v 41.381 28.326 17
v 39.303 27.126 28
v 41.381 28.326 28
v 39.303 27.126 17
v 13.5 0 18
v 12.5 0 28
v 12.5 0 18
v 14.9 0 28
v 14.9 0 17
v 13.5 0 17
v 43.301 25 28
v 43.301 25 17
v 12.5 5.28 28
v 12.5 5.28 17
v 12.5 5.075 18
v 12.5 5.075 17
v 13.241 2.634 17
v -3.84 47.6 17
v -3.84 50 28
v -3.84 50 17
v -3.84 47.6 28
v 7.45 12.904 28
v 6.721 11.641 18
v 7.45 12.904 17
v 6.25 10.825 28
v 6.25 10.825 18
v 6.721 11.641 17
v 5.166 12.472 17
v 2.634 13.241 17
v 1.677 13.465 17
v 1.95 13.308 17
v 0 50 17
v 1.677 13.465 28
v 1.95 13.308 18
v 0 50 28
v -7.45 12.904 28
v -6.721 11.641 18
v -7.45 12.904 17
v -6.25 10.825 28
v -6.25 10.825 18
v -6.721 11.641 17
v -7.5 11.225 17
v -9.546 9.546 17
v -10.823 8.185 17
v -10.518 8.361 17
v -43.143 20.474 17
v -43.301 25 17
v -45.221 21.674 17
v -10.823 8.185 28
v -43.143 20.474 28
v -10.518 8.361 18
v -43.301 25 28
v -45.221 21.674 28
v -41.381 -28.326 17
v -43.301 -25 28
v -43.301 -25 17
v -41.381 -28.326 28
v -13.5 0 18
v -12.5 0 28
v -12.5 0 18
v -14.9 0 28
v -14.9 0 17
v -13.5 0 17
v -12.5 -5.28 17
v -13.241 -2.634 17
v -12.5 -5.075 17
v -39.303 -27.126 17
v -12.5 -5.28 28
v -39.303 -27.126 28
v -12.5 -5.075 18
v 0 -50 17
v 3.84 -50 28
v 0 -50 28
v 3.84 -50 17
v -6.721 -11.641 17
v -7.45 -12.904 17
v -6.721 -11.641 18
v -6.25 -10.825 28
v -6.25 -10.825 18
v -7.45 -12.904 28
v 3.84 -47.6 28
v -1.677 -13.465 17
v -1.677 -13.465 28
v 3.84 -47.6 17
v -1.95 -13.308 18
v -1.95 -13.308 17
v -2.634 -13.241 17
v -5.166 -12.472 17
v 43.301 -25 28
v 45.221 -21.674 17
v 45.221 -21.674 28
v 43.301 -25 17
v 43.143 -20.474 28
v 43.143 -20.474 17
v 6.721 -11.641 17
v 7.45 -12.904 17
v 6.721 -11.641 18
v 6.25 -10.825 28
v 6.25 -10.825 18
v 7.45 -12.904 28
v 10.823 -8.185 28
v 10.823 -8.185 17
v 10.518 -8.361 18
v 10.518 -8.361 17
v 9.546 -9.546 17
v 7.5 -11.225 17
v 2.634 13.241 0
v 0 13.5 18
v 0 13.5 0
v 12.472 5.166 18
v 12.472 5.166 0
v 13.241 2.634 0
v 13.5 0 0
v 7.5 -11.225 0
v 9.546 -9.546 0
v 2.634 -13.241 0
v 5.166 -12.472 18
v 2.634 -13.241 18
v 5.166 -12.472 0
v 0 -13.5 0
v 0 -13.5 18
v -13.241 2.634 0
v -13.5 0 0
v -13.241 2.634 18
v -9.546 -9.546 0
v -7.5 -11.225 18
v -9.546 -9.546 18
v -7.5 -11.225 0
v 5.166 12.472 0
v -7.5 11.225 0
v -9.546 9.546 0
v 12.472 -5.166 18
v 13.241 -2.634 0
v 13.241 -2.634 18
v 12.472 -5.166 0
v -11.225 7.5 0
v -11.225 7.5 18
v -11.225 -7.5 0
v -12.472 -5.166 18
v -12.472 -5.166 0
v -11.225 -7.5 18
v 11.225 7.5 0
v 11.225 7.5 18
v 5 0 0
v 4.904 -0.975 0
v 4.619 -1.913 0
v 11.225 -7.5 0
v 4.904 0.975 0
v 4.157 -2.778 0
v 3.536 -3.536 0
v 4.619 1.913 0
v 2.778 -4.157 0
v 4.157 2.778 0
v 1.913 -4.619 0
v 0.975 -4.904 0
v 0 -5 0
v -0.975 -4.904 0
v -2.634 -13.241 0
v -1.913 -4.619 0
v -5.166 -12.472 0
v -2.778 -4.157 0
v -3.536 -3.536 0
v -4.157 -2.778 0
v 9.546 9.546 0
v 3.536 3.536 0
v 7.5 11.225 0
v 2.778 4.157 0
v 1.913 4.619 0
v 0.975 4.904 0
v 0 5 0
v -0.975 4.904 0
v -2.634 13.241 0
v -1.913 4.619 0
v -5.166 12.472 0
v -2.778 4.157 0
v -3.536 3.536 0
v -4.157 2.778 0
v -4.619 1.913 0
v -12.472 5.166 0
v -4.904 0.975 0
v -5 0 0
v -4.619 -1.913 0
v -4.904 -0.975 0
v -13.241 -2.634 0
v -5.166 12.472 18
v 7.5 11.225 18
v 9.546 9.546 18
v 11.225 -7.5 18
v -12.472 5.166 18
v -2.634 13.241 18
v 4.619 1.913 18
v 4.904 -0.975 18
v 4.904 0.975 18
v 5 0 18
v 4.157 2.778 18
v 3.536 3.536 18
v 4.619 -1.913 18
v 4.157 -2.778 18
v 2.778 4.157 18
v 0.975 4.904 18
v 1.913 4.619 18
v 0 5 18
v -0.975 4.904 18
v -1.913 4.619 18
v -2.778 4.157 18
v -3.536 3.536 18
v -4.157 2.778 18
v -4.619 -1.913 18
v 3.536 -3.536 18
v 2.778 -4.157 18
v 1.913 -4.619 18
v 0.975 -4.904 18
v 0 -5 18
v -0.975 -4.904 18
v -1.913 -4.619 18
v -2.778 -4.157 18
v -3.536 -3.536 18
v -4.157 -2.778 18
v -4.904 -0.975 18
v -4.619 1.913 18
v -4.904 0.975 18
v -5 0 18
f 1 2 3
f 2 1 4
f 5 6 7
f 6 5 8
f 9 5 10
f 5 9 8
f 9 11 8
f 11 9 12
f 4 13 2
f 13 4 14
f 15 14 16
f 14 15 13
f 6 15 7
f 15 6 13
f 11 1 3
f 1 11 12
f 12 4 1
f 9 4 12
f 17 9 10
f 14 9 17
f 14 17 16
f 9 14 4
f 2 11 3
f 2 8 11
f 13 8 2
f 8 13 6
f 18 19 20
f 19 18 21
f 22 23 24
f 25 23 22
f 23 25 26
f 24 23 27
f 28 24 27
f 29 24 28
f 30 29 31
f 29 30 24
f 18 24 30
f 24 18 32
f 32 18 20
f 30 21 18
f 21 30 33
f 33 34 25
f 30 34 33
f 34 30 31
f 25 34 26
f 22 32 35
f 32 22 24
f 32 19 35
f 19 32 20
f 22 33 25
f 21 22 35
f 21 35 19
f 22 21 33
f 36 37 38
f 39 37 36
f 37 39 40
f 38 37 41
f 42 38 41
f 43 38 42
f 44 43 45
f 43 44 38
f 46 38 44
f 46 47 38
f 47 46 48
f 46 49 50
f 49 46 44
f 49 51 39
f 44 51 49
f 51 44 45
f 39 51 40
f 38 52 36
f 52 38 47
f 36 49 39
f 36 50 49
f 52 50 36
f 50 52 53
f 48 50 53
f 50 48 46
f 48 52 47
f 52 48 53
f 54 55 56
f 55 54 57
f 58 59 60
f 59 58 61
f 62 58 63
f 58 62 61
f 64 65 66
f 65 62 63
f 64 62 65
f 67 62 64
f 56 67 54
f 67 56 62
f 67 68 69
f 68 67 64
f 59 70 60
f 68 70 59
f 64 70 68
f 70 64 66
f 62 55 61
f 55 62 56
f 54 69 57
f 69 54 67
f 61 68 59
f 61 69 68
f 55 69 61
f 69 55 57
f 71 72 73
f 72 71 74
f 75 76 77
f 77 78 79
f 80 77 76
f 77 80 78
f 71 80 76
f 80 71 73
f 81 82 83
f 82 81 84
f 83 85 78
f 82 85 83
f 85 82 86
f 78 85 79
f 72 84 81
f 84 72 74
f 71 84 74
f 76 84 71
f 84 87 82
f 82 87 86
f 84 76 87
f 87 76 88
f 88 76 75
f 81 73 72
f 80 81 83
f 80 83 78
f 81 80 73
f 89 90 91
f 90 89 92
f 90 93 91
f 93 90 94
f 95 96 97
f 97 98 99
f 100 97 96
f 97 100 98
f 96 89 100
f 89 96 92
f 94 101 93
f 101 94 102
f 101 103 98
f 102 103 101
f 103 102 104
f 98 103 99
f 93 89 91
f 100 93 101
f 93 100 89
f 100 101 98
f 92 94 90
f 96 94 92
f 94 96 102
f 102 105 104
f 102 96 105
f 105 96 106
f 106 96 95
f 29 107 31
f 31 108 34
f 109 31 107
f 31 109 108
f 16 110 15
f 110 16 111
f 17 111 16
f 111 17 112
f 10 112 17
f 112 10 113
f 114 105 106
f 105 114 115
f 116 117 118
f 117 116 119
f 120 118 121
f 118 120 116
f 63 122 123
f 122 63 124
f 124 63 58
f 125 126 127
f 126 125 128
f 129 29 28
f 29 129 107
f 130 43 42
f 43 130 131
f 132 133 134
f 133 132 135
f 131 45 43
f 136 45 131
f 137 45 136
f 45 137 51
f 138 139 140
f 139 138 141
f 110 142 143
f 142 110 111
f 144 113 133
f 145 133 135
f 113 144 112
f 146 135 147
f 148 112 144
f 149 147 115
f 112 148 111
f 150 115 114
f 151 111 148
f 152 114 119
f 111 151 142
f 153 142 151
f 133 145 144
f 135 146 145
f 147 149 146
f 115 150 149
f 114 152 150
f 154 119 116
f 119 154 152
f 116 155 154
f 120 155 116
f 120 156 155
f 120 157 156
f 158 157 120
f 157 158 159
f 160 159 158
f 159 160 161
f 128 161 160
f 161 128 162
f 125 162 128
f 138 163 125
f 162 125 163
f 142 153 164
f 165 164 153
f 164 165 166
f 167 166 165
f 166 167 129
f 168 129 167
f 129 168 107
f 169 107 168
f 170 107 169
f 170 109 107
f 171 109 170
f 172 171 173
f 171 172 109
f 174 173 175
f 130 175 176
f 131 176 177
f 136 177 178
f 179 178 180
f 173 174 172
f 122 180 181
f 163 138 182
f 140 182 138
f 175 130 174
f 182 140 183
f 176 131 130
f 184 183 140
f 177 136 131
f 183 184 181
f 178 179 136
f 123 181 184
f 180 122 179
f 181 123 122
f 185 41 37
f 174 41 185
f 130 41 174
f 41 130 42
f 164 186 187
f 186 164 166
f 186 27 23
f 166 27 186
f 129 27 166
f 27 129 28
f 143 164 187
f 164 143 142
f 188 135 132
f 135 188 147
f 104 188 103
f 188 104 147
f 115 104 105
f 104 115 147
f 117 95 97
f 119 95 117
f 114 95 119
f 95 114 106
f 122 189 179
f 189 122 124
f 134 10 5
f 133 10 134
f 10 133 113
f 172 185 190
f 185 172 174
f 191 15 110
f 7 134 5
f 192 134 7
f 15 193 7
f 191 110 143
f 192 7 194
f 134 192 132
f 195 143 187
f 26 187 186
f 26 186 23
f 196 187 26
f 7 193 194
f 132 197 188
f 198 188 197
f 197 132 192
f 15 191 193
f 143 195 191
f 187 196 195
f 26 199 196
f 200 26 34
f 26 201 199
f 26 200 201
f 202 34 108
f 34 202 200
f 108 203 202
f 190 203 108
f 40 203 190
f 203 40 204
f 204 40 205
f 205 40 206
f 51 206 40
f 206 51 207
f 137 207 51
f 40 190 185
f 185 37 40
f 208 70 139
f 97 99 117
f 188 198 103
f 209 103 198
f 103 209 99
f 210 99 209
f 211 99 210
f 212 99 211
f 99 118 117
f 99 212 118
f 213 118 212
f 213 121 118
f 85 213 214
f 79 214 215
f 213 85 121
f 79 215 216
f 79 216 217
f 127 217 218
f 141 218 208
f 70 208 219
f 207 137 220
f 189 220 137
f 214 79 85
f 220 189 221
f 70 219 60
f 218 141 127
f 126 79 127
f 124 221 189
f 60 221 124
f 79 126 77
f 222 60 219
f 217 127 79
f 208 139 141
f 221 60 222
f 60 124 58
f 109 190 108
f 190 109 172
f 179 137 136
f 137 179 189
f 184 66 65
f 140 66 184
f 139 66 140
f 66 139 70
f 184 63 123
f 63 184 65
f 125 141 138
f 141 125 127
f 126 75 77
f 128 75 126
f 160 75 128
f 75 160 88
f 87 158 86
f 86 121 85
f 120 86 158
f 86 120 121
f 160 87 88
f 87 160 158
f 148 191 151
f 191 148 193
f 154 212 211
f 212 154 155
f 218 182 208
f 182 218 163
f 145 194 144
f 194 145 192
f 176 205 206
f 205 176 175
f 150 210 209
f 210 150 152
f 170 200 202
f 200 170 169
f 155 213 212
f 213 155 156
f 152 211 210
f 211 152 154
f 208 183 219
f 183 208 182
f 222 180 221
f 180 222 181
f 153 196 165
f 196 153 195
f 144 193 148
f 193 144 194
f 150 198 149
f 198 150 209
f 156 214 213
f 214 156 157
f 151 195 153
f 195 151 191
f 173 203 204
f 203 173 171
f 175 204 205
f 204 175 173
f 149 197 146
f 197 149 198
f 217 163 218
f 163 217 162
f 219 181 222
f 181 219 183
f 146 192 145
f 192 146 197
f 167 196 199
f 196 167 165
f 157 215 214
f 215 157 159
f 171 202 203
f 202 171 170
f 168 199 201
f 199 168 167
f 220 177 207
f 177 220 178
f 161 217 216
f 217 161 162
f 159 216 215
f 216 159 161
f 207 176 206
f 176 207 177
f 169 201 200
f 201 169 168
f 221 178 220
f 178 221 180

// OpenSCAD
$fn = 32;

// ----------------------------------------------------------------------
// Impeller: 100 mm, 6 blades, 28 mm tall
// ----------------------------------------------------------------------

// --- parameters (mm) ---
boss_d = 27;              // hub diameter
boss_h = 18;              // hub height
rotor_d = 100;            // outer diameter over the blades
vane_count = 6;           // number of blades
blade_t = 2.4;            // blade thickness
blade_h = 10;             // blade height
blade_in_r = 12.5;        // blade root radius
blade_out_r = 47.6;       // blade tip radius
sweep = 30;               // blade sweep, degrees
bore_d = 10;              // shaft bore

module hub() {
  cylinder(h = boss_h, d = boss_d);
}

module blade() {
  /* blade swept between two boxes: hull of the root and the tip section */
  hull() {
    translate([blade_in_r, 0, boss_h - 1])
      cube([blade_t, blade_t * 2.2, blade_h + 1], center = false);
    rotate([0, 0, sweep])
      translate([blade_out_r, 0, boss_h - 1])
        cube([blade_t, blade_t * 1.6, blade_h + 1], center = false);
  }
}

module blades() {
  for (i = [0 : vane_count - 1])
    rotate([0, 0, i * 360 / vane_count]) blade();
}

difference() {
  union() {
    hub();
    blades();
  }
  translate([0, 0, -1]) cylinder(h = boss_h + blade_h + 0 + 3, d = bore_d);
}
